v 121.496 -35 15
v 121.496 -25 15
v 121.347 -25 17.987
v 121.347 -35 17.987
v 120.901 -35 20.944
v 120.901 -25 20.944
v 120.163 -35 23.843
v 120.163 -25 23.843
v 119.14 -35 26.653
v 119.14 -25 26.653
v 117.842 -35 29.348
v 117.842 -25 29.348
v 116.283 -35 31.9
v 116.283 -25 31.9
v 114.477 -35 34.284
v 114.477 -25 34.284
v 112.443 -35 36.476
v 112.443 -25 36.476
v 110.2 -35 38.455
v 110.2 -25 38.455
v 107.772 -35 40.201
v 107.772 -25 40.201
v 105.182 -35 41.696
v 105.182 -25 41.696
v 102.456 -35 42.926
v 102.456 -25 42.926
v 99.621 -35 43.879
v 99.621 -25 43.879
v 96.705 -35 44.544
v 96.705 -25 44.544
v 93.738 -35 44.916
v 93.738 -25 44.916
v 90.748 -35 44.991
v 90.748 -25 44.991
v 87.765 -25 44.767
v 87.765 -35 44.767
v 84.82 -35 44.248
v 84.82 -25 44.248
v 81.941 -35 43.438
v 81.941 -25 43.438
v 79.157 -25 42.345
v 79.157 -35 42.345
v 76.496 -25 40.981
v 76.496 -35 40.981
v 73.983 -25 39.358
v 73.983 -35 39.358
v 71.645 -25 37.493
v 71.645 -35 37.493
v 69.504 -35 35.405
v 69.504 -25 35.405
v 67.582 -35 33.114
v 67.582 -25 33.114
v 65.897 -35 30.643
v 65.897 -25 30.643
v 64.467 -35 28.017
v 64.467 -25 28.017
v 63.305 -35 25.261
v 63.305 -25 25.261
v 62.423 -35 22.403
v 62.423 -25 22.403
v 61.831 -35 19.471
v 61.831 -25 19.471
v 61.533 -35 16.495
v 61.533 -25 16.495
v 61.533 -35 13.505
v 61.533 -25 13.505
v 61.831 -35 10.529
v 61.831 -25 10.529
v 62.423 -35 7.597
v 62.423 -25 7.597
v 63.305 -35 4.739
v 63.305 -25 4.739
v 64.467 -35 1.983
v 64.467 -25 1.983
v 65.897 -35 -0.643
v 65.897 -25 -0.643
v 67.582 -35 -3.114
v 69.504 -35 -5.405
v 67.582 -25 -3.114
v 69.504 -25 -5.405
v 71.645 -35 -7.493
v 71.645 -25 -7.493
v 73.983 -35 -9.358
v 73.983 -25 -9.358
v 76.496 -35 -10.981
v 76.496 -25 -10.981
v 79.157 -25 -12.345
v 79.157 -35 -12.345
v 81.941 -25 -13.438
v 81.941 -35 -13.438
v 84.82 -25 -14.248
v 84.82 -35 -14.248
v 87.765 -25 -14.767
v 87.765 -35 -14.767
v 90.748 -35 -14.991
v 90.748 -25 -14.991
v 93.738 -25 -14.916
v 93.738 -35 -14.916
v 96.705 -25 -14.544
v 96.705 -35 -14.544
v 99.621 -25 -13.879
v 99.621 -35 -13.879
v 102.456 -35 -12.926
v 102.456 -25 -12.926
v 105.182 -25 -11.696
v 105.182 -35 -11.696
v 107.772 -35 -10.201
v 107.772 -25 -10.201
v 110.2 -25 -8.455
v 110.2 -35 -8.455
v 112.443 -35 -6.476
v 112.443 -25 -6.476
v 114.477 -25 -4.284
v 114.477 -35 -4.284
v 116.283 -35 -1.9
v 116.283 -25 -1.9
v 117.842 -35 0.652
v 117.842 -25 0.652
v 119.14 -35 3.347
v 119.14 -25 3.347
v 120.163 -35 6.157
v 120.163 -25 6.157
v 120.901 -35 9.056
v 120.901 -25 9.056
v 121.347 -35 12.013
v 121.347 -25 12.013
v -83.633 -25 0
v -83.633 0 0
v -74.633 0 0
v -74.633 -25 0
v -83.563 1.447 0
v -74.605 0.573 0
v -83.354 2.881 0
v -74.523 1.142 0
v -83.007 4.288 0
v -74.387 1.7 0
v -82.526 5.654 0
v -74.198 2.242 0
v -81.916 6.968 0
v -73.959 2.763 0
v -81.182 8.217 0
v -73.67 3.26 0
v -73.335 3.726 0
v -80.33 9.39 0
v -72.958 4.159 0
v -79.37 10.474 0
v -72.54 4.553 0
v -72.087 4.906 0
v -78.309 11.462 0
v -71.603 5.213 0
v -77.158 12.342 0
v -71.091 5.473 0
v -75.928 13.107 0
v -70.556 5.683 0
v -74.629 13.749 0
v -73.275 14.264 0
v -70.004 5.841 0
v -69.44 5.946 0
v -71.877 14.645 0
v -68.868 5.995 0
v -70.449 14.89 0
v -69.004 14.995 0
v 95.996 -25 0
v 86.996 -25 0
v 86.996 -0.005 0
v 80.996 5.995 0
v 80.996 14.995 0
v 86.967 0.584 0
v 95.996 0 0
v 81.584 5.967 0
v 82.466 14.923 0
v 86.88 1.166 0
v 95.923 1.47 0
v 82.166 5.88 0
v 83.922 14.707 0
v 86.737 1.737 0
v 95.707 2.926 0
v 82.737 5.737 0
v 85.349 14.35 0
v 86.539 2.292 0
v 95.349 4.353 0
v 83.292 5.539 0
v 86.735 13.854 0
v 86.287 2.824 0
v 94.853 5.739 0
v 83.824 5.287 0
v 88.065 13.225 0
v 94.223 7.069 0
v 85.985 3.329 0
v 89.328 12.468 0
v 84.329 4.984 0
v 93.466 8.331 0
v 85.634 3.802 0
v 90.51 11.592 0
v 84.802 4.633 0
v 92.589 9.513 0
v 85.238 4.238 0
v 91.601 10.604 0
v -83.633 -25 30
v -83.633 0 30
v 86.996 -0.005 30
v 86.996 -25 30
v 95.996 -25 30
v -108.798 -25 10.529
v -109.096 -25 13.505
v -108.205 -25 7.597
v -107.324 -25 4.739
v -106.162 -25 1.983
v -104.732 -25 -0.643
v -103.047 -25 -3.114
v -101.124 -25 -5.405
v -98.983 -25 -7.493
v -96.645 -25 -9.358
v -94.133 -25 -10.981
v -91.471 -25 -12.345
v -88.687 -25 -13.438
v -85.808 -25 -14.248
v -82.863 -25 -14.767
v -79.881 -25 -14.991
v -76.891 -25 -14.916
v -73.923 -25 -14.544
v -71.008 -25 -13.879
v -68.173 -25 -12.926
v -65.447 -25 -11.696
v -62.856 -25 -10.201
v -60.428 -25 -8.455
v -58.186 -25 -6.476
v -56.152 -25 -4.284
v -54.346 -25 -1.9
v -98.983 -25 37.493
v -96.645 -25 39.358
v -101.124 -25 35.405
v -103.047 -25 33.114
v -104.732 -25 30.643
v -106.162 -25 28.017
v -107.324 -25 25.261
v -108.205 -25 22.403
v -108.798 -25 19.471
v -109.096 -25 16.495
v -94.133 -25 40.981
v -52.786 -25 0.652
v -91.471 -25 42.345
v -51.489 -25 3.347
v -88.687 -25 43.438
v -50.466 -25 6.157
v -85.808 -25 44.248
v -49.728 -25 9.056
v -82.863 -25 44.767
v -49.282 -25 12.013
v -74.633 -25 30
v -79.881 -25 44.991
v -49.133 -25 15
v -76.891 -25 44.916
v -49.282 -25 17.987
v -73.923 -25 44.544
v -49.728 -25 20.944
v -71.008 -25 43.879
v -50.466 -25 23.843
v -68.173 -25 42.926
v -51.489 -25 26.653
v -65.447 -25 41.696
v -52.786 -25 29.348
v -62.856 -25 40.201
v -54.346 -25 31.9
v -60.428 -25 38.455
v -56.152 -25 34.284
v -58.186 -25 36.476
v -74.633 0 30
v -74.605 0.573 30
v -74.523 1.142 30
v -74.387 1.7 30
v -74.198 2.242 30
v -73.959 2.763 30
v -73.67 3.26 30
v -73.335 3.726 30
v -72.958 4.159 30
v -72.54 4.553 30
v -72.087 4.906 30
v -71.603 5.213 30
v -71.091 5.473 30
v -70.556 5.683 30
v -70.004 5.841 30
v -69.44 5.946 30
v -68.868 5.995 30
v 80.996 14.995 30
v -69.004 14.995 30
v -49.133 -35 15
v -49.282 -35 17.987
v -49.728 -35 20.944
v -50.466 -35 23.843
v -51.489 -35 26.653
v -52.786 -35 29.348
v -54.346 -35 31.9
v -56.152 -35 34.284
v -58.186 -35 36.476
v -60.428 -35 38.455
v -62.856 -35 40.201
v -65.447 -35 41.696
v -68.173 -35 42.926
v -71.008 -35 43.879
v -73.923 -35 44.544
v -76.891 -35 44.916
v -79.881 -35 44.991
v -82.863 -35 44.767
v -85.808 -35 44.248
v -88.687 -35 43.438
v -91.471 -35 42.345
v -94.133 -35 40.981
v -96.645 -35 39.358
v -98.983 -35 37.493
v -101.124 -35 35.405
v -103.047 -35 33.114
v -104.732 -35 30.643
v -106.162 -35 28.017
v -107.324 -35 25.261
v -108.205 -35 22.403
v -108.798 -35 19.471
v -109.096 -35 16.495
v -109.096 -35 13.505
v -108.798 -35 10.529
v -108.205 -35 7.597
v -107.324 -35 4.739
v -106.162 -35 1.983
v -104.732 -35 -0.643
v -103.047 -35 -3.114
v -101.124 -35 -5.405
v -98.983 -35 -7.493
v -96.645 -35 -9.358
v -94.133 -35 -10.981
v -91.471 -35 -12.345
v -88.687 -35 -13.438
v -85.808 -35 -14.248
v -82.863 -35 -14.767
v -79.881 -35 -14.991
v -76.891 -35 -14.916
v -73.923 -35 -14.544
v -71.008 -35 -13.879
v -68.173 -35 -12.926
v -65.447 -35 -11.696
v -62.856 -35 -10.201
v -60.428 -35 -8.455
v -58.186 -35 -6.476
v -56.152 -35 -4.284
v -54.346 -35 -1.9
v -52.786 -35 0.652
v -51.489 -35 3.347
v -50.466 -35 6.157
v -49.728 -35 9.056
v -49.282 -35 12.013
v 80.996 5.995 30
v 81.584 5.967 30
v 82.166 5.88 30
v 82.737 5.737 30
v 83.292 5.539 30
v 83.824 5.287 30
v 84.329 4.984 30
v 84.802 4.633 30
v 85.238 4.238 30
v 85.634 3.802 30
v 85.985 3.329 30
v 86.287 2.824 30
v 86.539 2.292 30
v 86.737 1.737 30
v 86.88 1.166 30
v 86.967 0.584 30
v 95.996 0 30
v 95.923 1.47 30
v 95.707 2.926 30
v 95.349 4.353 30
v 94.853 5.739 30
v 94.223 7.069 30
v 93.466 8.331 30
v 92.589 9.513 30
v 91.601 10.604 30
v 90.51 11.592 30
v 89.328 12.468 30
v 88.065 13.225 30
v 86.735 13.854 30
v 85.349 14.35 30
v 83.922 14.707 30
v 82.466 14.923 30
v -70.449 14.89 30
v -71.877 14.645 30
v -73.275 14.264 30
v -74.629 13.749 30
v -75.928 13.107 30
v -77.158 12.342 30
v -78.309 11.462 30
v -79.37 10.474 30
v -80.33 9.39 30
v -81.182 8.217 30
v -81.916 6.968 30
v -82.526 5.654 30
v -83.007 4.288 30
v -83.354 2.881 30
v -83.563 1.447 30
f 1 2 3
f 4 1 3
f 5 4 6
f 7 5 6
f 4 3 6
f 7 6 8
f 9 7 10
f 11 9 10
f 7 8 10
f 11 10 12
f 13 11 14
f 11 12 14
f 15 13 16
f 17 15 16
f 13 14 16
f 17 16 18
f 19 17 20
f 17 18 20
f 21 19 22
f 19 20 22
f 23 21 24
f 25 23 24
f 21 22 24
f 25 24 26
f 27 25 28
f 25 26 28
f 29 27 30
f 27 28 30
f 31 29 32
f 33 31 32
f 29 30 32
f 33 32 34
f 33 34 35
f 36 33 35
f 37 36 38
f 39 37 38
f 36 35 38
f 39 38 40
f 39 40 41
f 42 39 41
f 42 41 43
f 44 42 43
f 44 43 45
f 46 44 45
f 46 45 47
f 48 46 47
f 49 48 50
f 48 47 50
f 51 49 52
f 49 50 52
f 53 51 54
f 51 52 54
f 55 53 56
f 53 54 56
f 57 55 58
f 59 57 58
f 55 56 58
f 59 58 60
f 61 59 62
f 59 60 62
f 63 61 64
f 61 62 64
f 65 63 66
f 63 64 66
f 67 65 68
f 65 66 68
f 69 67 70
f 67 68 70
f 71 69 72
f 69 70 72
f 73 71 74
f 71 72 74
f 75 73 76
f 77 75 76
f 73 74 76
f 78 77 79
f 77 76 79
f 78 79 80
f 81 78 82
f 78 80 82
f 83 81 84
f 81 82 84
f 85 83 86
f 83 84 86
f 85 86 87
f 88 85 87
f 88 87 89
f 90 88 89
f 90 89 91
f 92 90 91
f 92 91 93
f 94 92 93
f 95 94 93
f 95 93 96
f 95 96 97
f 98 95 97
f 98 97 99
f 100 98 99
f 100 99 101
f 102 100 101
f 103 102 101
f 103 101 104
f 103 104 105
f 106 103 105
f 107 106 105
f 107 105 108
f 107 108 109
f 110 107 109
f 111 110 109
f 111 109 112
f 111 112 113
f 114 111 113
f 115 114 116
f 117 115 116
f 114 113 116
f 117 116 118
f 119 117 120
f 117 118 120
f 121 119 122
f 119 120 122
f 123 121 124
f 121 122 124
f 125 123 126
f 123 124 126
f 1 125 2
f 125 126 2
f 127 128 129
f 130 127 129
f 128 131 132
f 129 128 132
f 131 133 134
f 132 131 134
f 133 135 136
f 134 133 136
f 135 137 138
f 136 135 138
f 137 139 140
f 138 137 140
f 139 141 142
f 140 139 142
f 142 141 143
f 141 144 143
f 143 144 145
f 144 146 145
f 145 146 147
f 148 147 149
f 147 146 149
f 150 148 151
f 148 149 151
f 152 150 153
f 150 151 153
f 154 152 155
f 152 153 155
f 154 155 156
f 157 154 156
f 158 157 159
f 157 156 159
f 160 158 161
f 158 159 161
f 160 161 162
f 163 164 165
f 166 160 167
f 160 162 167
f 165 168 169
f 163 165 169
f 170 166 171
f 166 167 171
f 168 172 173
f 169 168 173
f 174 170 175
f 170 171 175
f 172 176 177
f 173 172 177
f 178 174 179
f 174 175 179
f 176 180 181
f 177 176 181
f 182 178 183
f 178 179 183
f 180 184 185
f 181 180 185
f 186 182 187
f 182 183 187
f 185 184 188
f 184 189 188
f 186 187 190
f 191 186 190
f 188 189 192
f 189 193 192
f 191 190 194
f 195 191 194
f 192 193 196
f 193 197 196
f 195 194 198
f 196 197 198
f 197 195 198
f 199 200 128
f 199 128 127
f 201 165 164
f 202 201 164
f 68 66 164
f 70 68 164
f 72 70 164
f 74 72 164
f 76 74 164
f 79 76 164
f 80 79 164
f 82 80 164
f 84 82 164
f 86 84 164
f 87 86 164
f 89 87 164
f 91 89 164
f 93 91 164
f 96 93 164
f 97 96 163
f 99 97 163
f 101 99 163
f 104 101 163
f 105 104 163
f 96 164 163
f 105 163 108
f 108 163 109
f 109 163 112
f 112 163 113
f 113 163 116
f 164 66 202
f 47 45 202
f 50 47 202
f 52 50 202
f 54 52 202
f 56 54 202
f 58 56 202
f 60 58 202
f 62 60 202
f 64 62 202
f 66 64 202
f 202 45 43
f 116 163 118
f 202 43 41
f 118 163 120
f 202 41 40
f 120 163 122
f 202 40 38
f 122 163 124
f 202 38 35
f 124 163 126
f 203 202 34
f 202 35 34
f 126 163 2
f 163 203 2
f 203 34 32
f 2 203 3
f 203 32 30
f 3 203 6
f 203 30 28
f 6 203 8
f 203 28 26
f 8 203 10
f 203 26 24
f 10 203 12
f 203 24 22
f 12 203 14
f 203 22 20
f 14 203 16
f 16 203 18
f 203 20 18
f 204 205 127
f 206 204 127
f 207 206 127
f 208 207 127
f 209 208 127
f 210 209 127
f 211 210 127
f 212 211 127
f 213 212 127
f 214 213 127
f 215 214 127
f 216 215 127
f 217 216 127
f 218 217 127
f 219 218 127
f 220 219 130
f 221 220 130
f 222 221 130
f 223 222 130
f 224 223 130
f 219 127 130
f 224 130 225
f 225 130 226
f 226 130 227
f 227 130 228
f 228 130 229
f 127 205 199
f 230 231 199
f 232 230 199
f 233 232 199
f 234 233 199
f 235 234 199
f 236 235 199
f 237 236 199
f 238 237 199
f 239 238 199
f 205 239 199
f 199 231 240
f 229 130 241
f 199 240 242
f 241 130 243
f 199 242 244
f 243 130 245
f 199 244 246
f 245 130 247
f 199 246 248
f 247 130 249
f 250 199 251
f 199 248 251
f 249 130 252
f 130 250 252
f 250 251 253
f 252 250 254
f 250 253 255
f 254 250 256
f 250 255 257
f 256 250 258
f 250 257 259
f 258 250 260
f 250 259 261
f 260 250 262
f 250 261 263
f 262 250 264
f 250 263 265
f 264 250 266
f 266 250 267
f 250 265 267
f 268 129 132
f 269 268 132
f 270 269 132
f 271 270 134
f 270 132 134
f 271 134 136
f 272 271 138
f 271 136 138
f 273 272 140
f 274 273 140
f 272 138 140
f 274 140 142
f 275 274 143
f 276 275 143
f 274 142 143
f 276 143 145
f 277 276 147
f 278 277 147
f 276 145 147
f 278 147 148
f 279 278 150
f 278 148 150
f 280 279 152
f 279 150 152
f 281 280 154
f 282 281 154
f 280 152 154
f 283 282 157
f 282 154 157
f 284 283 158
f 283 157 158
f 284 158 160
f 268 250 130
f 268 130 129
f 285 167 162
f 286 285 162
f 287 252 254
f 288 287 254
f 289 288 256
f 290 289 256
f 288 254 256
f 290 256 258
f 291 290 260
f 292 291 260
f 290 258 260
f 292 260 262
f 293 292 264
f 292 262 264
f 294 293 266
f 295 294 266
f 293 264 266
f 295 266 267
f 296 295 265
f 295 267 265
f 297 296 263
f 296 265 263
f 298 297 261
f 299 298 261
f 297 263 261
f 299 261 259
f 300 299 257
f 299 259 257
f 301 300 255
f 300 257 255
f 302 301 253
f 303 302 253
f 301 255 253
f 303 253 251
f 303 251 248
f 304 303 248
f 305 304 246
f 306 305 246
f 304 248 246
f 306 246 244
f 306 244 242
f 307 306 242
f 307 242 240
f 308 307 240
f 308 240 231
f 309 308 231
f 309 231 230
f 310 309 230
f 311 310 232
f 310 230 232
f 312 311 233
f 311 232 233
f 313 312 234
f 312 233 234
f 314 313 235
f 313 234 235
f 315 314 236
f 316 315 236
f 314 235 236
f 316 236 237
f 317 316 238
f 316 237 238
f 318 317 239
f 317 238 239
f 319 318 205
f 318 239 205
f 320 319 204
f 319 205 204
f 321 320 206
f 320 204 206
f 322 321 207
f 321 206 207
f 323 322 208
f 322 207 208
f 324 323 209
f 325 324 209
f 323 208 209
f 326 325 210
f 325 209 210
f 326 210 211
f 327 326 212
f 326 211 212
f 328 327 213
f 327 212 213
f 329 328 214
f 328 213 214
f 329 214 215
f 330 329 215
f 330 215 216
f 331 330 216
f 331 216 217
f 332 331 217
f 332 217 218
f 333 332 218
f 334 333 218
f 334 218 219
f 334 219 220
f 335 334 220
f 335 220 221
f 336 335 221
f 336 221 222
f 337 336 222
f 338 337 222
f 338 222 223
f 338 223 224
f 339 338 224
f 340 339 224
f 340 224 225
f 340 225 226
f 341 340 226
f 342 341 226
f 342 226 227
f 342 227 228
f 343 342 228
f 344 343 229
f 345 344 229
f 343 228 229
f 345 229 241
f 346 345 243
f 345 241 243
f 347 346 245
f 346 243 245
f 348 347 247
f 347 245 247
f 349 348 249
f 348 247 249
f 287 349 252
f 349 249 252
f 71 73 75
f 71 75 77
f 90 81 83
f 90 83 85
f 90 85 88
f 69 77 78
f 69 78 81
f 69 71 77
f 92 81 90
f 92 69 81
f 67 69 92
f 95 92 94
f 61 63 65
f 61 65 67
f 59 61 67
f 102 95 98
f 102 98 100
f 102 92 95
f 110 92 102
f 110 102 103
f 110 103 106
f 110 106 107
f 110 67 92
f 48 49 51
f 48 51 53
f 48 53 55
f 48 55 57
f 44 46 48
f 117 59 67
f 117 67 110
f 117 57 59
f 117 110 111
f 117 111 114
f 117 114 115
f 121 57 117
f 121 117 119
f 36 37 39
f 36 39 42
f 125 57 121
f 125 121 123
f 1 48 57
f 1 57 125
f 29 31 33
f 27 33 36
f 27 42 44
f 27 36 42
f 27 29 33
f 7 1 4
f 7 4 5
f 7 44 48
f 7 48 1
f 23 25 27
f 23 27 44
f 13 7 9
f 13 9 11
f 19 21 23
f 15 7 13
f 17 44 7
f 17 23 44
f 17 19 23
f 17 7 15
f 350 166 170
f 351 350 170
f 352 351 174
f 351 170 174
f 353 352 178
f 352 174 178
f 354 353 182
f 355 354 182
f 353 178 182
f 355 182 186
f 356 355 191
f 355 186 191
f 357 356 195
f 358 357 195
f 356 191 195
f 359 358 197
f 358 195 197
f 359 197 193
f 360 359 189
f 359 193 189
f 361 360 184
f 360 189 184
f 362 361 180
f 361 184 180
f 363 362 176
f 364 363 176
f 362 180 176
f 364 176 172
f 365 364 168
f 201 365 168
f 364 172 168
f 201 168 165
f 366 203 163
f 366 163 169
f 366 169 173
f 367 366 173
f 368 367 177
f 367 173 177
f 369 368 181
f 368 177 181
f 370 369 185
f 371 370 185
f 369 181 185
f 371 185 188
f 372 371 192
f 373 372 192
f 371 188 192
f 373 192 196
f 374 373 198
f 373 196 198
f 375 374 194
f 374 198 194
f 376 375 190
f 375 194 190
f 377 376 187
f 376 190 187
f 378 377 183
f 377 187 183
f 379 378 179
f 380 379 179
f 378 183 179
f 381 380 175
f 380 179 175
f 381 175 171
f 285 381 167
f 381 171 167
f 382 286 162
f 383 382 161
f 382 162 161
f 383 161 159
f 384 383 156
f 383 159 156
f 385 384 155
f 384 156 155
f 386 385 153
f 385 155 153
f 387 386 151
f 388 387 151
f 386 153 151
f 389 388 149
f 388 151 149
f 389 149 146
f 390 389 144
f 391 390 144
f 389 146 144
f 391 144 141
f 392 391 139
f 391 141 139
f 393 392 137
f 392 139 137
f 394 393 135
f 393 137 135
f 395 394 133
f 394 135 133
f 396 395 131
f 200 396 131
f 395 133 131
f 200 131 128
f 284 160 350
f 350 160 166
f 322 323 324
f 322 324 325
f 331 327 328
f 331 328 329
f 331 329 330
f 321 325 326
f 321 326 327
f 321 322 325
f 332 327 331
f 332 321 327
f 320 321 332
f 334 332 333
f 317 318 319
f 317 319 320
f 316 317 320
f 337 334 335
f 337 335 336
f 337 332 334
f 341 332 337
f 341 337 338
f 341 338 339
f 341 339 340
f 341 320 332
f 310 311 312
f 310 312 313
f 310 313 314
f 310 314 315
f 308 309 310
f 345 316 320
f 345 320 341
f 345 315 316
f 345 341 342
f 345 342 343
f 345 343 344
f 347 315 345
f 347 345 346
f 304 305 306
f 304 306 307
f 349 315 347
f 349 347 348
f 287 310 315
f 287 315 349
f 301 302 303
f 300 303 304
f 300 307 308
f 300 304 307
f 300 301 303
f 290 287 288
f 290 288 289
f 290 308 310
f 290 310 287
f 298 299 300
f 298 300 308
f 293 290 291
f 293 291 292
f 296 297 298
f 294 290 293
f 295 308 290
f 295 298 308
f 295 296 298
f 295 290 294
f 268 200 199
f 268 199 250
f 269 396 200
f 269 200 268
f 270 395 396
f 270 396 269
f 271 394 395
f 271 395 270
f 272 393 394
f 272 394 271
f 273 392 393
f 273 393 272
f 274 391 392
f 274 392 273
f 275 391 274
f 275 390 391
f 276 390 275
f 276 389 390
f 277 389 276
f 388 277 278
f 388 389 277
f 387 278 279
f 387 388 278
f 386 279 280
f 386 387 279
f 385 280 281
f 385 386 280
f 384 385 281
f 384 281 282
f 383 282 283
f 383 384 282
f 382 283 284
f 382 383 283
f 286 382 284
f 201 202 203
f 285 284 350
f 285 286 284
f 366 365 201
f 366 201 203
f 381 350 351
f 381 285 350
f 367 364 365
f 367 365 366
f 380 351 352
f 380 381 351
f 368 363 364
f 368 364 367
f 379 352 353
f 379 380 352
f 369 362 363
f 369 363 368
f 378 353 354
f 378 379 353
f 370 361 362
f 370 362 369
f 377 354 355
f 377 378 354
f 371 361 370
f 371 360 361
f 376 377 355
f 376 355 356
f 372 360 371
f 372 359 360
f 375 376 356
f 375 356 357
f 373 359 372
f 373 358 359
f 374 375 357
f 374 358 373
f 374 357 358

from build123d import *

# Parameters (mm, degrees)
F1_DEPTH = 30
F2_R     = 30
F3_DEPTH = 10
F4_R     = 30
F5_DEPTH = 10


# Not quite as in the source:
# - ends of sketch curves that miss each other by under 0.0002 mm in the source are joined


with BuildPart() as f1:
    # F0 (on Top) → F1 (new body)
    with BuildSketch(Plane.XY):
        with BuildLine():
            Line((-83.6328645892, 0), (-83.6328645892, -25))
            Line((-83.6328645892, -25), (-74.6328645685, -25))
            Line((-74.6328645685, -25), (-74.6328645685, 0))
            ThreePointArc((-74.6328645685, 0), (-72.9577352395, 4.1587851122), (-68.8677000121, 5.9954025783))
            Line((-68.8677000121, 5.9954025783), (80.9957853142, 5.9954025783))
            ThreePointArc((80.9957853142, 5.9954025783), (85.2384259867, 4.2380432715), (86.9957852935, -0.004597401))
            Line((86.9957852935, -0.004597401), (86.9957845889, -25))
            Line((86.9957845889, -25), (95.9957846097, -25))
            Line((95.9957846097, -25), (95.9957846097, 0))
            ThreePointArc((95.9957846097, 0), (91.6007614807, 10.603629619), (80.9957853142, 14.995402599))
            Line((80.9957853142, 14.995402599), (-69.0042146858, 14.995402599))
            ThreePointArc((-69.0042146858, 14.995402599), (-79.3699557095, 10.4744868264), (-83.6328645892, 0))
        make_face()
    extrude(amount=F1_DEPTH)

    # F2 (on face) → F3 (join)
    with BuildSketch(Plane.XZ.offset(25)):
        with Locations((-79.1328645789, 15)):
            Circle(F2_R)
    extrude(amount=F3_DEPTH)

    # F4 (on face) → F5 (join)
    with BuildSketch(Plane.XZ.offset(25)):
        with Locations((91.4957845993, 15)):
            Circle(F4_R)
    extrude(amount=F5_DEPTH)


solid = f1.part
